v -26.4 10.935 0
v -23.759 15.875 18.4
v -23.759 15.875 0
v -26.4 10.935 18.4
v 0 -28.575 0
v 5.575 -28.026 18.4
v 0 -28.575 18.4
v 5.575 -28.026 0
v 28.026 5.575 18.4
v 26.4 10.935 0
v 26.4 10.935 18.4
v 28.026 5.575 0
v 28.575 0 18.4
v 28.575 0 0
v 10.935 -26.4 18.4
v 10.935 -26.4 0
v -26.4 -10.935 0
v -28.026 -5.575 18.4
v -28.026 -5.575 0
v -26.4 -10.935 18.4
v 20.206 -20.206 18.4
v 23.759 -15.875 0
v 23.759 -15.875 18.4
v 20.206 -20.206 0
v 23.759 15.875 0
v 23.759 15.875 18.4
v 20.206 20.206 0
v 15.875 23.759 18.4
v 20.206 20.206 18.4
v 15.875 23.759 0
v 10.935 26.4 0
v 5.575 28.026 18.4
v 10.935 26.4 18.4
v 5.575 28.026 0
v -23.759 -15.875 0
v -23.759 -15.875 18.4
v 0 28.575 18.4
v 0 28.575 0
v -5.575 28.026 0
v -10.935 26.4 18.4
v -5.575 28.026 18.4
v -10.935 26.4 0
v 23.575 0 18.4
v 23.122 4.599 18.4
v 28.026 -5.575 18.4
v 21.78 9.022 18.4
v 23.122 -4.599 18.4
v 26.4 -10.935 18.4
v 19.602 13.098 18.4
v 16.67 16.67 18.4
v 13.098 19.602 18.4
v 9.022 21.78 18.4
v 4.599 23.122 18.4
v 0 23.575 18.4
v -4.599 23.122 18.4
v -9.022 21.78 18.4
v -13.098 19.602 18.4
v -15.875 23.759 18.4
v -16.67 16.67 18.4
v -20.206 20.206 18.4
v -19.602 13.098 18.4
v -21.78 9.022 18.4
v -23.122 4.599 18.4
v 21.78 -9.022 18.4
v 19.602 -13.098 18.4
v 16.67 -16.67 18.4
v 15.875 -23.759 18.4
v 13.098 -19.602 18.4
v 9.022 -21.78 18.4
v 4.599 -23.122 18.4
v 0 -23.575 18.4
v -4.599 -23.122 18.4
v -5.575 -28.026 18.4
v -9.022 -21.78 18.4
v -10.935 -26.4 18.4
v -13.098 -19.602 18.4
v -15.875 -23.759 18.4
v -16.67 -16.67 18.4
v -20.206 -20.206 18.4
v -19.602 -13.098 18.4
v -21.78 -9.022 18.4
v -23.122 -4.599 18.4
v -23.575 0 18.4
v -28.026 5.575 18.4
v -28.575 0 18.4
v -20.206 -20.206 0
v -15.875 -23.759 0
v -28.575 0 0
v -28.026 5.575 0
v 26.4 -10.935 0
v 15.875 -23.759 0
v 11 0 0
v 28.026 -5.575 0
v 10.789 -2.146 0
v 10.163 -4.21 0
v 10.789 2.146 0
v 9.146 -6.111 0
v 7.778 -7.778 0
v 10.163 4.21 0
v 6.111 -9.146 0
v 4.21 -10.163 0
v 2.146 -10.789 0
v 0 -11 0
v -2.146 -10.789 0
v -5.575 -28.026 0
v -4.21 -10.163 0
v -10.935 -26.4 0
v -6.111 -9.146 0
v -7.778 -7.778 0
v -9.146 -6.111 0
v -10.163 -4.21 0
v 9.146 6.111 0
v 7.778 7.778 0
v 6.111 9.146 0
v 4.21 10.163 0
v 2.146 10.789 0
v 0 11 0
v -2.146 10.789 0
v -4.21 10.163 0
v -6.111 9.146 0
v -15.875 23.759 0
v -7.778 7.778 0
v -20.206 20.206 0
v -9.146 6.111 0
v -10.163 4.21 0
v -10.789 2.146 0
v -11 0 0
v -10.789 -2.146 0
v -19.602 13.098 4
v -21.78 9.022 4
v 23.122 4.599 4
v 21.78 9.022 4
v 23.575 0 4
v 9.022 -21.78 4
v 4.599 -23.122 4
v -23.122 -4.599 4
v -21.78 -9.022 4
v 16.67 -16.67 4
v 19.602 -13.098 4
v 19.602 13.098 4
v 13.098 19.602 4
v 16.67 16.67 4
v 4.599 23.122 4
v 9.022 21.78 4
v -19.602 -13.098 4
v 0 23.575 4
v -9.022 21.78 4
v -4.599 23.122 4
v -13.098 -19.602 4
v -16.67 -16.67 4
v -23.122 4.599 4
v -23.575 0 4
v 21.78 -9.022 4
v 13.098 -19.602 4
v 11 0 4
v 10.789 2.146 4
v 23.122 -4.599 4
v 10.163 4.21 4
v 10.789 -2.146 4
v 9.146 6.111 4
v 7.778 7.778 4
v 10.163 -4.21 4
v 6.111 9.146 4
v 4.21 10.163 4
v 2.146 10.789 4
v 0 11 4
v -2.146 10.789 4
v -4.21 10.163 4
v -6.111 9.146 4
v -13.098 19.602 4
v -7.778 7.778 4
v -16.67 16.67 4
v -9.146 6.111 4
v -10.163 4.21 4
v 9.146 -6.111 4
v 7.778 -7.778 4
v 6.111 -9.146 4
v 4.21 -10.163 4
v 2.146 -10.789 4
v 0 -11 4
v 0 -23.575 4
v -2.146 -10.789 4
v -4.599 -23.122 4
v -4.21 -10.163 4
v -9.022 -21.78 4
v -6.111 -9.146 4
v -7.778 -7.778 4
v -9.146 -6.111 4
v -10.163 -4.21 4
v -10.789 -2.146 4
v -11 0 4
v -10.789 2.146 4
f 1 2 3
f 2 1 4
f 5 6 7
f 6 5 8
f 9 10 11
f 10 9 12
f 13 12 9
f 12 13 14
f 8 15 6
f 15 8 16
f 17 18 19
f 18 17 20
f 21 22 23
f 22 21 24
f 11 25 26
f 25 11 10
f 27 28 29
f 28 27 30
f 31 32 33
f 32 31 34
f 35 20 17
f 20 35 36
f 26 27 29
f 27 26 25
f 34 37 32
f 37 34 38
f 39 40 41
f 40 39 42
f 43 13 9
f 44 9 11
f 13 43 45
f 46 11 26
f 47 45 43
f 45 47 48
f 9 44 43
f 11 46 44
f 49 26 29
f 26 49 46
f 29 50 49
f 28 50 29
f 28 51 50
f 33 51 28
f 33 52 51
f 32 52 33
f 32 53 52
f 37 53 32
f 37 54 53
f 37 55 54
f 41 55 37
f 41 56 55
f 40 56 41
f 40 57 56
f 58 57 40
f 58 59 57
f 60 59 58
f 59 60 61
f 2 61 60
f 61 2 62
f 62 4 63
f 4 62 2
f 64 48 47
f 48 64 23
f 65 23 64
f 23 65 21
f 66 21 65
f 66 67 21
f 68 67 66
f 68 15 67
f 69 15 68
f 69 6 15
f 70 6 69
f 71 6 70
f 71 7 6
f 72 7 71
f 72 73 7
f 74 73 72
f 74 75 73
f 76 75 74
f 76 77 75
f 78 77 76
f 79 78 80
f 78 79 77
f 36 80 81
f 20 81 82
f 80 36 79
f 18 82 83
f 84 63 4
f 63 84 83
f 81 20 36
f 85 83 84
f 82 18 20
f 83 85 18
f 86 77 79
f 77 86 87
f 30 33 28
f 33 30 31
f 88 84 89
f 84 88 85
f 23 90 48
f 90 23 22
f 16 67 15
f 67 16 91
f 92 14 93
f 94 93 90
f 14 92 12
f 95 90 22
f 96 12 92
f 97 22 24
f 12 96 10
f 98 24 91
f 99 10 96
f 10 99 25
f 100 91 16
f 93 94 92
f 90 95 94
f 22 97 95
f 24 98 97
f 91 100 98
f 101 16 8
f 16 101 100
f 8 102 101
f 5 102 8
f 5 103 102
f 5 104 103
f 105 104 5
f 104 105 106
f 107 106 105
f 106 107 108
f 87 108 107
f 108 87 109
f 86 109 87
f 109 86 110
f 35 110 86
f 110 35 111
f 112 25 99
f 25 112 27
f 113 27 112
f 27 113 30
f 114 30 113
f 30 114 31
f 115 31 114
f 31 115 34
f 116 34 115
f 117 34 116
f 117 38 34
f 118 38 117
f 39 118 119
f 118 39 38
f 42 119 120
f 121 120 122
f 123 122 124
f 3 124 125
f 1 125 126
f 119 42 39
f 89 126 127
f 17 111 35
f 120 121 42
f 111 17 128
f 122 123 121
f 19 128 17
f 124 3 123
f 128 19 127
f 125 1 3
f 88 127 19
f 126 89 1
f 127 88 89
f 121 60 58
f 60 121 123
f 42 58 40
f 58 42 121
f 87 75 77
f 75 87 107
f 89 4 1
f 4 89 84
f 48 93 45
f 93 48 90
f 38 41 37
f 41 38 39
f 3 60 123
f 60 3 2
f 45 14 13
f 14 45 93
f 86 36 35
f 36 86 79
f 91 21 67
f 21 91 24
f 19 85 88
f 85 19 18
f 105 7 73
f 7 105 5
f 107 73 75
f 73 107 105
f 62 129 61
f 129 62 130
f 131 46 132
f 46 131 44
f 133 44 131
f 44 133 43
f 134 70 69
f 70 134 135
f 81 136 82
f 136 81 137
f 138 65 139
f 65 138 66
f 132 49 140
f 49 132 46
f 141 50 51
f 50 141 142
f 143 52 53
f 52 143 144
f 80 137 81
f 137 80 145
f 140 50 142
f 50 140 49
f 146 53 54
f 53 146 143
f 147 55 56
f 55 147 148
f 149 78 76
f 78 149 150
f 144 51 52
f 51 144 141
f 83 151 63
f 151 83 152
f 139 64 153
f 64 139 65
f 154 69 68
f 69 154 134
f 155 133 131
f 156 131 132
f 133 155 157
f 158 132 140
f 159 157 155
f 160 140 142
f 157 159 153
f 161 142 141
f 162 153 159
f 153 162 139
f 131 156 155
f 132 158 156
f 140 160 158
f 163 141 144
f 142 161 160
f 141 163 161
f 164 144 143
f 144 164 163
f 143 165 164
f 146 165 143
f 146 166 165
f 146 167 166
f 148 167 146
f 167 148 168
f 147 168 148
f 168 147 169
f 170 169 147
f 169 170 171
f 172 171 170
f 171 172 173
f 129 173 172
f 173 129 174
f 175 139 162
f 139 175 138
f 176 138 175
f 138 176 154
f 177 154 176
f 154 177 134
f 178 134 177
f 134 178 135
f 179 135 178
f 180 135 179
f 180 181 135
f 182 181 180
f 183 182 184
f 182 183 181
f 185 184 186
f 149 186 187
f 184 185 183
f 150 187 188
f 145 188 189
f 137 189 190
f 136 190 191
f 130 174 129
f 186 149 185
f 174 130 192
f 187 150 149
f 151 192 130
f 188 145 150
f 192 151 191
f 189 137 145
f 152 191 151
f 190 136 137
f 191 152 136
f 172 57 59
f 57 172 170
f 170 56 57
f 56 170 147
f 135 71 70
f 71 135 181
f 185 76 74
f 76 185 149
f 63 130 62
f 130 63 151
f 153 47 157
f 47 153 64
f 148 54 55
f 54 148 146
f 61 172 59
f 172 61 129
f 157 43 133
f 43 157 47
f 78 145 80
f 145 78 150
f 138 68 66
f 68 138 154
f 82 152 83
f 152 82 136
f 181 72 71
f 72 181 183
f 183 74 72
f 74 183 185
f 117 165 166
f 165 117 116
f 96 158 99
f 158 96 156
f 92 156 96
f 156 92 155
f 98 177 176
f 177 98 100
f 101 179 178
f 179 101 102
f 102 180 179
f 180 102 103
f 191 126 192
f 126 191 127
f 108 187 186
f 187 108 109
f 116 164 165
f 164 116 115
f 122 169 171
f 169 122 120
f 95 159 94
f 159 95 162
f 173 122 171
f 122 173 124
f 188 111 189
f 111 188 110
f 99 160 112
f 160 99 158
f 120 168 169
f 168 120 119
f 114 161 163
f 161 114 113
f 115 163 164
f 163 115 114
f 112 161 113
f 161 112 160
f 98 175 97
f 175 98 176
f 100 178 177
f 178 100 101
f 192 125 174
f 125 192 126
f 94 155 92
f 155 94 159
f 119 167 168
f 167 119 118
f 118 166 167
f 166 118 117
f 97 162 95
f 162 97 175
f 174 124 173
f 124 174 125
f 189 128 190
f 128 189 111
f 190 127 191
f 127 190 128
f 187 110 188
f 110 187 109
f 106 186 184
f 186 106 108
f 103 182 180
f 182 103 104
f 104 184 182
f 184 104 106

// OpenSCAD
$fn = 32;

// ----------------------------------------------------------------------
// Bearing housing: seat for 6204 (47 x 14 mm), 57.15 mm body
// ----------------------------------------------------------------------

// --- parameters (mm) ---
body_od = 57.15;          // housing outside diameter
body_h = 18.4;            // overall housing height
wall = 5;                 // wall thickness
pocket_d = 47.15;         // 6204 seat, 0.15 mm clearance
seat_h = 14.4;            // pocket depth
shoulder = 4;             // shoulder under the bearing
pass_d = 22;              // shaft passage

module body() {
  cylinder(h = body_h, d = body_od);
}

difference() {
  union() {
    body();
  }
  translate([0, 0, body_h - seat_h]) cylinder(h = seat_h + 1, d = pocket_d);
  translate([0, 0, -1]) cylinder(h = body_h - seat_h + 1, d = pass_d);
}
